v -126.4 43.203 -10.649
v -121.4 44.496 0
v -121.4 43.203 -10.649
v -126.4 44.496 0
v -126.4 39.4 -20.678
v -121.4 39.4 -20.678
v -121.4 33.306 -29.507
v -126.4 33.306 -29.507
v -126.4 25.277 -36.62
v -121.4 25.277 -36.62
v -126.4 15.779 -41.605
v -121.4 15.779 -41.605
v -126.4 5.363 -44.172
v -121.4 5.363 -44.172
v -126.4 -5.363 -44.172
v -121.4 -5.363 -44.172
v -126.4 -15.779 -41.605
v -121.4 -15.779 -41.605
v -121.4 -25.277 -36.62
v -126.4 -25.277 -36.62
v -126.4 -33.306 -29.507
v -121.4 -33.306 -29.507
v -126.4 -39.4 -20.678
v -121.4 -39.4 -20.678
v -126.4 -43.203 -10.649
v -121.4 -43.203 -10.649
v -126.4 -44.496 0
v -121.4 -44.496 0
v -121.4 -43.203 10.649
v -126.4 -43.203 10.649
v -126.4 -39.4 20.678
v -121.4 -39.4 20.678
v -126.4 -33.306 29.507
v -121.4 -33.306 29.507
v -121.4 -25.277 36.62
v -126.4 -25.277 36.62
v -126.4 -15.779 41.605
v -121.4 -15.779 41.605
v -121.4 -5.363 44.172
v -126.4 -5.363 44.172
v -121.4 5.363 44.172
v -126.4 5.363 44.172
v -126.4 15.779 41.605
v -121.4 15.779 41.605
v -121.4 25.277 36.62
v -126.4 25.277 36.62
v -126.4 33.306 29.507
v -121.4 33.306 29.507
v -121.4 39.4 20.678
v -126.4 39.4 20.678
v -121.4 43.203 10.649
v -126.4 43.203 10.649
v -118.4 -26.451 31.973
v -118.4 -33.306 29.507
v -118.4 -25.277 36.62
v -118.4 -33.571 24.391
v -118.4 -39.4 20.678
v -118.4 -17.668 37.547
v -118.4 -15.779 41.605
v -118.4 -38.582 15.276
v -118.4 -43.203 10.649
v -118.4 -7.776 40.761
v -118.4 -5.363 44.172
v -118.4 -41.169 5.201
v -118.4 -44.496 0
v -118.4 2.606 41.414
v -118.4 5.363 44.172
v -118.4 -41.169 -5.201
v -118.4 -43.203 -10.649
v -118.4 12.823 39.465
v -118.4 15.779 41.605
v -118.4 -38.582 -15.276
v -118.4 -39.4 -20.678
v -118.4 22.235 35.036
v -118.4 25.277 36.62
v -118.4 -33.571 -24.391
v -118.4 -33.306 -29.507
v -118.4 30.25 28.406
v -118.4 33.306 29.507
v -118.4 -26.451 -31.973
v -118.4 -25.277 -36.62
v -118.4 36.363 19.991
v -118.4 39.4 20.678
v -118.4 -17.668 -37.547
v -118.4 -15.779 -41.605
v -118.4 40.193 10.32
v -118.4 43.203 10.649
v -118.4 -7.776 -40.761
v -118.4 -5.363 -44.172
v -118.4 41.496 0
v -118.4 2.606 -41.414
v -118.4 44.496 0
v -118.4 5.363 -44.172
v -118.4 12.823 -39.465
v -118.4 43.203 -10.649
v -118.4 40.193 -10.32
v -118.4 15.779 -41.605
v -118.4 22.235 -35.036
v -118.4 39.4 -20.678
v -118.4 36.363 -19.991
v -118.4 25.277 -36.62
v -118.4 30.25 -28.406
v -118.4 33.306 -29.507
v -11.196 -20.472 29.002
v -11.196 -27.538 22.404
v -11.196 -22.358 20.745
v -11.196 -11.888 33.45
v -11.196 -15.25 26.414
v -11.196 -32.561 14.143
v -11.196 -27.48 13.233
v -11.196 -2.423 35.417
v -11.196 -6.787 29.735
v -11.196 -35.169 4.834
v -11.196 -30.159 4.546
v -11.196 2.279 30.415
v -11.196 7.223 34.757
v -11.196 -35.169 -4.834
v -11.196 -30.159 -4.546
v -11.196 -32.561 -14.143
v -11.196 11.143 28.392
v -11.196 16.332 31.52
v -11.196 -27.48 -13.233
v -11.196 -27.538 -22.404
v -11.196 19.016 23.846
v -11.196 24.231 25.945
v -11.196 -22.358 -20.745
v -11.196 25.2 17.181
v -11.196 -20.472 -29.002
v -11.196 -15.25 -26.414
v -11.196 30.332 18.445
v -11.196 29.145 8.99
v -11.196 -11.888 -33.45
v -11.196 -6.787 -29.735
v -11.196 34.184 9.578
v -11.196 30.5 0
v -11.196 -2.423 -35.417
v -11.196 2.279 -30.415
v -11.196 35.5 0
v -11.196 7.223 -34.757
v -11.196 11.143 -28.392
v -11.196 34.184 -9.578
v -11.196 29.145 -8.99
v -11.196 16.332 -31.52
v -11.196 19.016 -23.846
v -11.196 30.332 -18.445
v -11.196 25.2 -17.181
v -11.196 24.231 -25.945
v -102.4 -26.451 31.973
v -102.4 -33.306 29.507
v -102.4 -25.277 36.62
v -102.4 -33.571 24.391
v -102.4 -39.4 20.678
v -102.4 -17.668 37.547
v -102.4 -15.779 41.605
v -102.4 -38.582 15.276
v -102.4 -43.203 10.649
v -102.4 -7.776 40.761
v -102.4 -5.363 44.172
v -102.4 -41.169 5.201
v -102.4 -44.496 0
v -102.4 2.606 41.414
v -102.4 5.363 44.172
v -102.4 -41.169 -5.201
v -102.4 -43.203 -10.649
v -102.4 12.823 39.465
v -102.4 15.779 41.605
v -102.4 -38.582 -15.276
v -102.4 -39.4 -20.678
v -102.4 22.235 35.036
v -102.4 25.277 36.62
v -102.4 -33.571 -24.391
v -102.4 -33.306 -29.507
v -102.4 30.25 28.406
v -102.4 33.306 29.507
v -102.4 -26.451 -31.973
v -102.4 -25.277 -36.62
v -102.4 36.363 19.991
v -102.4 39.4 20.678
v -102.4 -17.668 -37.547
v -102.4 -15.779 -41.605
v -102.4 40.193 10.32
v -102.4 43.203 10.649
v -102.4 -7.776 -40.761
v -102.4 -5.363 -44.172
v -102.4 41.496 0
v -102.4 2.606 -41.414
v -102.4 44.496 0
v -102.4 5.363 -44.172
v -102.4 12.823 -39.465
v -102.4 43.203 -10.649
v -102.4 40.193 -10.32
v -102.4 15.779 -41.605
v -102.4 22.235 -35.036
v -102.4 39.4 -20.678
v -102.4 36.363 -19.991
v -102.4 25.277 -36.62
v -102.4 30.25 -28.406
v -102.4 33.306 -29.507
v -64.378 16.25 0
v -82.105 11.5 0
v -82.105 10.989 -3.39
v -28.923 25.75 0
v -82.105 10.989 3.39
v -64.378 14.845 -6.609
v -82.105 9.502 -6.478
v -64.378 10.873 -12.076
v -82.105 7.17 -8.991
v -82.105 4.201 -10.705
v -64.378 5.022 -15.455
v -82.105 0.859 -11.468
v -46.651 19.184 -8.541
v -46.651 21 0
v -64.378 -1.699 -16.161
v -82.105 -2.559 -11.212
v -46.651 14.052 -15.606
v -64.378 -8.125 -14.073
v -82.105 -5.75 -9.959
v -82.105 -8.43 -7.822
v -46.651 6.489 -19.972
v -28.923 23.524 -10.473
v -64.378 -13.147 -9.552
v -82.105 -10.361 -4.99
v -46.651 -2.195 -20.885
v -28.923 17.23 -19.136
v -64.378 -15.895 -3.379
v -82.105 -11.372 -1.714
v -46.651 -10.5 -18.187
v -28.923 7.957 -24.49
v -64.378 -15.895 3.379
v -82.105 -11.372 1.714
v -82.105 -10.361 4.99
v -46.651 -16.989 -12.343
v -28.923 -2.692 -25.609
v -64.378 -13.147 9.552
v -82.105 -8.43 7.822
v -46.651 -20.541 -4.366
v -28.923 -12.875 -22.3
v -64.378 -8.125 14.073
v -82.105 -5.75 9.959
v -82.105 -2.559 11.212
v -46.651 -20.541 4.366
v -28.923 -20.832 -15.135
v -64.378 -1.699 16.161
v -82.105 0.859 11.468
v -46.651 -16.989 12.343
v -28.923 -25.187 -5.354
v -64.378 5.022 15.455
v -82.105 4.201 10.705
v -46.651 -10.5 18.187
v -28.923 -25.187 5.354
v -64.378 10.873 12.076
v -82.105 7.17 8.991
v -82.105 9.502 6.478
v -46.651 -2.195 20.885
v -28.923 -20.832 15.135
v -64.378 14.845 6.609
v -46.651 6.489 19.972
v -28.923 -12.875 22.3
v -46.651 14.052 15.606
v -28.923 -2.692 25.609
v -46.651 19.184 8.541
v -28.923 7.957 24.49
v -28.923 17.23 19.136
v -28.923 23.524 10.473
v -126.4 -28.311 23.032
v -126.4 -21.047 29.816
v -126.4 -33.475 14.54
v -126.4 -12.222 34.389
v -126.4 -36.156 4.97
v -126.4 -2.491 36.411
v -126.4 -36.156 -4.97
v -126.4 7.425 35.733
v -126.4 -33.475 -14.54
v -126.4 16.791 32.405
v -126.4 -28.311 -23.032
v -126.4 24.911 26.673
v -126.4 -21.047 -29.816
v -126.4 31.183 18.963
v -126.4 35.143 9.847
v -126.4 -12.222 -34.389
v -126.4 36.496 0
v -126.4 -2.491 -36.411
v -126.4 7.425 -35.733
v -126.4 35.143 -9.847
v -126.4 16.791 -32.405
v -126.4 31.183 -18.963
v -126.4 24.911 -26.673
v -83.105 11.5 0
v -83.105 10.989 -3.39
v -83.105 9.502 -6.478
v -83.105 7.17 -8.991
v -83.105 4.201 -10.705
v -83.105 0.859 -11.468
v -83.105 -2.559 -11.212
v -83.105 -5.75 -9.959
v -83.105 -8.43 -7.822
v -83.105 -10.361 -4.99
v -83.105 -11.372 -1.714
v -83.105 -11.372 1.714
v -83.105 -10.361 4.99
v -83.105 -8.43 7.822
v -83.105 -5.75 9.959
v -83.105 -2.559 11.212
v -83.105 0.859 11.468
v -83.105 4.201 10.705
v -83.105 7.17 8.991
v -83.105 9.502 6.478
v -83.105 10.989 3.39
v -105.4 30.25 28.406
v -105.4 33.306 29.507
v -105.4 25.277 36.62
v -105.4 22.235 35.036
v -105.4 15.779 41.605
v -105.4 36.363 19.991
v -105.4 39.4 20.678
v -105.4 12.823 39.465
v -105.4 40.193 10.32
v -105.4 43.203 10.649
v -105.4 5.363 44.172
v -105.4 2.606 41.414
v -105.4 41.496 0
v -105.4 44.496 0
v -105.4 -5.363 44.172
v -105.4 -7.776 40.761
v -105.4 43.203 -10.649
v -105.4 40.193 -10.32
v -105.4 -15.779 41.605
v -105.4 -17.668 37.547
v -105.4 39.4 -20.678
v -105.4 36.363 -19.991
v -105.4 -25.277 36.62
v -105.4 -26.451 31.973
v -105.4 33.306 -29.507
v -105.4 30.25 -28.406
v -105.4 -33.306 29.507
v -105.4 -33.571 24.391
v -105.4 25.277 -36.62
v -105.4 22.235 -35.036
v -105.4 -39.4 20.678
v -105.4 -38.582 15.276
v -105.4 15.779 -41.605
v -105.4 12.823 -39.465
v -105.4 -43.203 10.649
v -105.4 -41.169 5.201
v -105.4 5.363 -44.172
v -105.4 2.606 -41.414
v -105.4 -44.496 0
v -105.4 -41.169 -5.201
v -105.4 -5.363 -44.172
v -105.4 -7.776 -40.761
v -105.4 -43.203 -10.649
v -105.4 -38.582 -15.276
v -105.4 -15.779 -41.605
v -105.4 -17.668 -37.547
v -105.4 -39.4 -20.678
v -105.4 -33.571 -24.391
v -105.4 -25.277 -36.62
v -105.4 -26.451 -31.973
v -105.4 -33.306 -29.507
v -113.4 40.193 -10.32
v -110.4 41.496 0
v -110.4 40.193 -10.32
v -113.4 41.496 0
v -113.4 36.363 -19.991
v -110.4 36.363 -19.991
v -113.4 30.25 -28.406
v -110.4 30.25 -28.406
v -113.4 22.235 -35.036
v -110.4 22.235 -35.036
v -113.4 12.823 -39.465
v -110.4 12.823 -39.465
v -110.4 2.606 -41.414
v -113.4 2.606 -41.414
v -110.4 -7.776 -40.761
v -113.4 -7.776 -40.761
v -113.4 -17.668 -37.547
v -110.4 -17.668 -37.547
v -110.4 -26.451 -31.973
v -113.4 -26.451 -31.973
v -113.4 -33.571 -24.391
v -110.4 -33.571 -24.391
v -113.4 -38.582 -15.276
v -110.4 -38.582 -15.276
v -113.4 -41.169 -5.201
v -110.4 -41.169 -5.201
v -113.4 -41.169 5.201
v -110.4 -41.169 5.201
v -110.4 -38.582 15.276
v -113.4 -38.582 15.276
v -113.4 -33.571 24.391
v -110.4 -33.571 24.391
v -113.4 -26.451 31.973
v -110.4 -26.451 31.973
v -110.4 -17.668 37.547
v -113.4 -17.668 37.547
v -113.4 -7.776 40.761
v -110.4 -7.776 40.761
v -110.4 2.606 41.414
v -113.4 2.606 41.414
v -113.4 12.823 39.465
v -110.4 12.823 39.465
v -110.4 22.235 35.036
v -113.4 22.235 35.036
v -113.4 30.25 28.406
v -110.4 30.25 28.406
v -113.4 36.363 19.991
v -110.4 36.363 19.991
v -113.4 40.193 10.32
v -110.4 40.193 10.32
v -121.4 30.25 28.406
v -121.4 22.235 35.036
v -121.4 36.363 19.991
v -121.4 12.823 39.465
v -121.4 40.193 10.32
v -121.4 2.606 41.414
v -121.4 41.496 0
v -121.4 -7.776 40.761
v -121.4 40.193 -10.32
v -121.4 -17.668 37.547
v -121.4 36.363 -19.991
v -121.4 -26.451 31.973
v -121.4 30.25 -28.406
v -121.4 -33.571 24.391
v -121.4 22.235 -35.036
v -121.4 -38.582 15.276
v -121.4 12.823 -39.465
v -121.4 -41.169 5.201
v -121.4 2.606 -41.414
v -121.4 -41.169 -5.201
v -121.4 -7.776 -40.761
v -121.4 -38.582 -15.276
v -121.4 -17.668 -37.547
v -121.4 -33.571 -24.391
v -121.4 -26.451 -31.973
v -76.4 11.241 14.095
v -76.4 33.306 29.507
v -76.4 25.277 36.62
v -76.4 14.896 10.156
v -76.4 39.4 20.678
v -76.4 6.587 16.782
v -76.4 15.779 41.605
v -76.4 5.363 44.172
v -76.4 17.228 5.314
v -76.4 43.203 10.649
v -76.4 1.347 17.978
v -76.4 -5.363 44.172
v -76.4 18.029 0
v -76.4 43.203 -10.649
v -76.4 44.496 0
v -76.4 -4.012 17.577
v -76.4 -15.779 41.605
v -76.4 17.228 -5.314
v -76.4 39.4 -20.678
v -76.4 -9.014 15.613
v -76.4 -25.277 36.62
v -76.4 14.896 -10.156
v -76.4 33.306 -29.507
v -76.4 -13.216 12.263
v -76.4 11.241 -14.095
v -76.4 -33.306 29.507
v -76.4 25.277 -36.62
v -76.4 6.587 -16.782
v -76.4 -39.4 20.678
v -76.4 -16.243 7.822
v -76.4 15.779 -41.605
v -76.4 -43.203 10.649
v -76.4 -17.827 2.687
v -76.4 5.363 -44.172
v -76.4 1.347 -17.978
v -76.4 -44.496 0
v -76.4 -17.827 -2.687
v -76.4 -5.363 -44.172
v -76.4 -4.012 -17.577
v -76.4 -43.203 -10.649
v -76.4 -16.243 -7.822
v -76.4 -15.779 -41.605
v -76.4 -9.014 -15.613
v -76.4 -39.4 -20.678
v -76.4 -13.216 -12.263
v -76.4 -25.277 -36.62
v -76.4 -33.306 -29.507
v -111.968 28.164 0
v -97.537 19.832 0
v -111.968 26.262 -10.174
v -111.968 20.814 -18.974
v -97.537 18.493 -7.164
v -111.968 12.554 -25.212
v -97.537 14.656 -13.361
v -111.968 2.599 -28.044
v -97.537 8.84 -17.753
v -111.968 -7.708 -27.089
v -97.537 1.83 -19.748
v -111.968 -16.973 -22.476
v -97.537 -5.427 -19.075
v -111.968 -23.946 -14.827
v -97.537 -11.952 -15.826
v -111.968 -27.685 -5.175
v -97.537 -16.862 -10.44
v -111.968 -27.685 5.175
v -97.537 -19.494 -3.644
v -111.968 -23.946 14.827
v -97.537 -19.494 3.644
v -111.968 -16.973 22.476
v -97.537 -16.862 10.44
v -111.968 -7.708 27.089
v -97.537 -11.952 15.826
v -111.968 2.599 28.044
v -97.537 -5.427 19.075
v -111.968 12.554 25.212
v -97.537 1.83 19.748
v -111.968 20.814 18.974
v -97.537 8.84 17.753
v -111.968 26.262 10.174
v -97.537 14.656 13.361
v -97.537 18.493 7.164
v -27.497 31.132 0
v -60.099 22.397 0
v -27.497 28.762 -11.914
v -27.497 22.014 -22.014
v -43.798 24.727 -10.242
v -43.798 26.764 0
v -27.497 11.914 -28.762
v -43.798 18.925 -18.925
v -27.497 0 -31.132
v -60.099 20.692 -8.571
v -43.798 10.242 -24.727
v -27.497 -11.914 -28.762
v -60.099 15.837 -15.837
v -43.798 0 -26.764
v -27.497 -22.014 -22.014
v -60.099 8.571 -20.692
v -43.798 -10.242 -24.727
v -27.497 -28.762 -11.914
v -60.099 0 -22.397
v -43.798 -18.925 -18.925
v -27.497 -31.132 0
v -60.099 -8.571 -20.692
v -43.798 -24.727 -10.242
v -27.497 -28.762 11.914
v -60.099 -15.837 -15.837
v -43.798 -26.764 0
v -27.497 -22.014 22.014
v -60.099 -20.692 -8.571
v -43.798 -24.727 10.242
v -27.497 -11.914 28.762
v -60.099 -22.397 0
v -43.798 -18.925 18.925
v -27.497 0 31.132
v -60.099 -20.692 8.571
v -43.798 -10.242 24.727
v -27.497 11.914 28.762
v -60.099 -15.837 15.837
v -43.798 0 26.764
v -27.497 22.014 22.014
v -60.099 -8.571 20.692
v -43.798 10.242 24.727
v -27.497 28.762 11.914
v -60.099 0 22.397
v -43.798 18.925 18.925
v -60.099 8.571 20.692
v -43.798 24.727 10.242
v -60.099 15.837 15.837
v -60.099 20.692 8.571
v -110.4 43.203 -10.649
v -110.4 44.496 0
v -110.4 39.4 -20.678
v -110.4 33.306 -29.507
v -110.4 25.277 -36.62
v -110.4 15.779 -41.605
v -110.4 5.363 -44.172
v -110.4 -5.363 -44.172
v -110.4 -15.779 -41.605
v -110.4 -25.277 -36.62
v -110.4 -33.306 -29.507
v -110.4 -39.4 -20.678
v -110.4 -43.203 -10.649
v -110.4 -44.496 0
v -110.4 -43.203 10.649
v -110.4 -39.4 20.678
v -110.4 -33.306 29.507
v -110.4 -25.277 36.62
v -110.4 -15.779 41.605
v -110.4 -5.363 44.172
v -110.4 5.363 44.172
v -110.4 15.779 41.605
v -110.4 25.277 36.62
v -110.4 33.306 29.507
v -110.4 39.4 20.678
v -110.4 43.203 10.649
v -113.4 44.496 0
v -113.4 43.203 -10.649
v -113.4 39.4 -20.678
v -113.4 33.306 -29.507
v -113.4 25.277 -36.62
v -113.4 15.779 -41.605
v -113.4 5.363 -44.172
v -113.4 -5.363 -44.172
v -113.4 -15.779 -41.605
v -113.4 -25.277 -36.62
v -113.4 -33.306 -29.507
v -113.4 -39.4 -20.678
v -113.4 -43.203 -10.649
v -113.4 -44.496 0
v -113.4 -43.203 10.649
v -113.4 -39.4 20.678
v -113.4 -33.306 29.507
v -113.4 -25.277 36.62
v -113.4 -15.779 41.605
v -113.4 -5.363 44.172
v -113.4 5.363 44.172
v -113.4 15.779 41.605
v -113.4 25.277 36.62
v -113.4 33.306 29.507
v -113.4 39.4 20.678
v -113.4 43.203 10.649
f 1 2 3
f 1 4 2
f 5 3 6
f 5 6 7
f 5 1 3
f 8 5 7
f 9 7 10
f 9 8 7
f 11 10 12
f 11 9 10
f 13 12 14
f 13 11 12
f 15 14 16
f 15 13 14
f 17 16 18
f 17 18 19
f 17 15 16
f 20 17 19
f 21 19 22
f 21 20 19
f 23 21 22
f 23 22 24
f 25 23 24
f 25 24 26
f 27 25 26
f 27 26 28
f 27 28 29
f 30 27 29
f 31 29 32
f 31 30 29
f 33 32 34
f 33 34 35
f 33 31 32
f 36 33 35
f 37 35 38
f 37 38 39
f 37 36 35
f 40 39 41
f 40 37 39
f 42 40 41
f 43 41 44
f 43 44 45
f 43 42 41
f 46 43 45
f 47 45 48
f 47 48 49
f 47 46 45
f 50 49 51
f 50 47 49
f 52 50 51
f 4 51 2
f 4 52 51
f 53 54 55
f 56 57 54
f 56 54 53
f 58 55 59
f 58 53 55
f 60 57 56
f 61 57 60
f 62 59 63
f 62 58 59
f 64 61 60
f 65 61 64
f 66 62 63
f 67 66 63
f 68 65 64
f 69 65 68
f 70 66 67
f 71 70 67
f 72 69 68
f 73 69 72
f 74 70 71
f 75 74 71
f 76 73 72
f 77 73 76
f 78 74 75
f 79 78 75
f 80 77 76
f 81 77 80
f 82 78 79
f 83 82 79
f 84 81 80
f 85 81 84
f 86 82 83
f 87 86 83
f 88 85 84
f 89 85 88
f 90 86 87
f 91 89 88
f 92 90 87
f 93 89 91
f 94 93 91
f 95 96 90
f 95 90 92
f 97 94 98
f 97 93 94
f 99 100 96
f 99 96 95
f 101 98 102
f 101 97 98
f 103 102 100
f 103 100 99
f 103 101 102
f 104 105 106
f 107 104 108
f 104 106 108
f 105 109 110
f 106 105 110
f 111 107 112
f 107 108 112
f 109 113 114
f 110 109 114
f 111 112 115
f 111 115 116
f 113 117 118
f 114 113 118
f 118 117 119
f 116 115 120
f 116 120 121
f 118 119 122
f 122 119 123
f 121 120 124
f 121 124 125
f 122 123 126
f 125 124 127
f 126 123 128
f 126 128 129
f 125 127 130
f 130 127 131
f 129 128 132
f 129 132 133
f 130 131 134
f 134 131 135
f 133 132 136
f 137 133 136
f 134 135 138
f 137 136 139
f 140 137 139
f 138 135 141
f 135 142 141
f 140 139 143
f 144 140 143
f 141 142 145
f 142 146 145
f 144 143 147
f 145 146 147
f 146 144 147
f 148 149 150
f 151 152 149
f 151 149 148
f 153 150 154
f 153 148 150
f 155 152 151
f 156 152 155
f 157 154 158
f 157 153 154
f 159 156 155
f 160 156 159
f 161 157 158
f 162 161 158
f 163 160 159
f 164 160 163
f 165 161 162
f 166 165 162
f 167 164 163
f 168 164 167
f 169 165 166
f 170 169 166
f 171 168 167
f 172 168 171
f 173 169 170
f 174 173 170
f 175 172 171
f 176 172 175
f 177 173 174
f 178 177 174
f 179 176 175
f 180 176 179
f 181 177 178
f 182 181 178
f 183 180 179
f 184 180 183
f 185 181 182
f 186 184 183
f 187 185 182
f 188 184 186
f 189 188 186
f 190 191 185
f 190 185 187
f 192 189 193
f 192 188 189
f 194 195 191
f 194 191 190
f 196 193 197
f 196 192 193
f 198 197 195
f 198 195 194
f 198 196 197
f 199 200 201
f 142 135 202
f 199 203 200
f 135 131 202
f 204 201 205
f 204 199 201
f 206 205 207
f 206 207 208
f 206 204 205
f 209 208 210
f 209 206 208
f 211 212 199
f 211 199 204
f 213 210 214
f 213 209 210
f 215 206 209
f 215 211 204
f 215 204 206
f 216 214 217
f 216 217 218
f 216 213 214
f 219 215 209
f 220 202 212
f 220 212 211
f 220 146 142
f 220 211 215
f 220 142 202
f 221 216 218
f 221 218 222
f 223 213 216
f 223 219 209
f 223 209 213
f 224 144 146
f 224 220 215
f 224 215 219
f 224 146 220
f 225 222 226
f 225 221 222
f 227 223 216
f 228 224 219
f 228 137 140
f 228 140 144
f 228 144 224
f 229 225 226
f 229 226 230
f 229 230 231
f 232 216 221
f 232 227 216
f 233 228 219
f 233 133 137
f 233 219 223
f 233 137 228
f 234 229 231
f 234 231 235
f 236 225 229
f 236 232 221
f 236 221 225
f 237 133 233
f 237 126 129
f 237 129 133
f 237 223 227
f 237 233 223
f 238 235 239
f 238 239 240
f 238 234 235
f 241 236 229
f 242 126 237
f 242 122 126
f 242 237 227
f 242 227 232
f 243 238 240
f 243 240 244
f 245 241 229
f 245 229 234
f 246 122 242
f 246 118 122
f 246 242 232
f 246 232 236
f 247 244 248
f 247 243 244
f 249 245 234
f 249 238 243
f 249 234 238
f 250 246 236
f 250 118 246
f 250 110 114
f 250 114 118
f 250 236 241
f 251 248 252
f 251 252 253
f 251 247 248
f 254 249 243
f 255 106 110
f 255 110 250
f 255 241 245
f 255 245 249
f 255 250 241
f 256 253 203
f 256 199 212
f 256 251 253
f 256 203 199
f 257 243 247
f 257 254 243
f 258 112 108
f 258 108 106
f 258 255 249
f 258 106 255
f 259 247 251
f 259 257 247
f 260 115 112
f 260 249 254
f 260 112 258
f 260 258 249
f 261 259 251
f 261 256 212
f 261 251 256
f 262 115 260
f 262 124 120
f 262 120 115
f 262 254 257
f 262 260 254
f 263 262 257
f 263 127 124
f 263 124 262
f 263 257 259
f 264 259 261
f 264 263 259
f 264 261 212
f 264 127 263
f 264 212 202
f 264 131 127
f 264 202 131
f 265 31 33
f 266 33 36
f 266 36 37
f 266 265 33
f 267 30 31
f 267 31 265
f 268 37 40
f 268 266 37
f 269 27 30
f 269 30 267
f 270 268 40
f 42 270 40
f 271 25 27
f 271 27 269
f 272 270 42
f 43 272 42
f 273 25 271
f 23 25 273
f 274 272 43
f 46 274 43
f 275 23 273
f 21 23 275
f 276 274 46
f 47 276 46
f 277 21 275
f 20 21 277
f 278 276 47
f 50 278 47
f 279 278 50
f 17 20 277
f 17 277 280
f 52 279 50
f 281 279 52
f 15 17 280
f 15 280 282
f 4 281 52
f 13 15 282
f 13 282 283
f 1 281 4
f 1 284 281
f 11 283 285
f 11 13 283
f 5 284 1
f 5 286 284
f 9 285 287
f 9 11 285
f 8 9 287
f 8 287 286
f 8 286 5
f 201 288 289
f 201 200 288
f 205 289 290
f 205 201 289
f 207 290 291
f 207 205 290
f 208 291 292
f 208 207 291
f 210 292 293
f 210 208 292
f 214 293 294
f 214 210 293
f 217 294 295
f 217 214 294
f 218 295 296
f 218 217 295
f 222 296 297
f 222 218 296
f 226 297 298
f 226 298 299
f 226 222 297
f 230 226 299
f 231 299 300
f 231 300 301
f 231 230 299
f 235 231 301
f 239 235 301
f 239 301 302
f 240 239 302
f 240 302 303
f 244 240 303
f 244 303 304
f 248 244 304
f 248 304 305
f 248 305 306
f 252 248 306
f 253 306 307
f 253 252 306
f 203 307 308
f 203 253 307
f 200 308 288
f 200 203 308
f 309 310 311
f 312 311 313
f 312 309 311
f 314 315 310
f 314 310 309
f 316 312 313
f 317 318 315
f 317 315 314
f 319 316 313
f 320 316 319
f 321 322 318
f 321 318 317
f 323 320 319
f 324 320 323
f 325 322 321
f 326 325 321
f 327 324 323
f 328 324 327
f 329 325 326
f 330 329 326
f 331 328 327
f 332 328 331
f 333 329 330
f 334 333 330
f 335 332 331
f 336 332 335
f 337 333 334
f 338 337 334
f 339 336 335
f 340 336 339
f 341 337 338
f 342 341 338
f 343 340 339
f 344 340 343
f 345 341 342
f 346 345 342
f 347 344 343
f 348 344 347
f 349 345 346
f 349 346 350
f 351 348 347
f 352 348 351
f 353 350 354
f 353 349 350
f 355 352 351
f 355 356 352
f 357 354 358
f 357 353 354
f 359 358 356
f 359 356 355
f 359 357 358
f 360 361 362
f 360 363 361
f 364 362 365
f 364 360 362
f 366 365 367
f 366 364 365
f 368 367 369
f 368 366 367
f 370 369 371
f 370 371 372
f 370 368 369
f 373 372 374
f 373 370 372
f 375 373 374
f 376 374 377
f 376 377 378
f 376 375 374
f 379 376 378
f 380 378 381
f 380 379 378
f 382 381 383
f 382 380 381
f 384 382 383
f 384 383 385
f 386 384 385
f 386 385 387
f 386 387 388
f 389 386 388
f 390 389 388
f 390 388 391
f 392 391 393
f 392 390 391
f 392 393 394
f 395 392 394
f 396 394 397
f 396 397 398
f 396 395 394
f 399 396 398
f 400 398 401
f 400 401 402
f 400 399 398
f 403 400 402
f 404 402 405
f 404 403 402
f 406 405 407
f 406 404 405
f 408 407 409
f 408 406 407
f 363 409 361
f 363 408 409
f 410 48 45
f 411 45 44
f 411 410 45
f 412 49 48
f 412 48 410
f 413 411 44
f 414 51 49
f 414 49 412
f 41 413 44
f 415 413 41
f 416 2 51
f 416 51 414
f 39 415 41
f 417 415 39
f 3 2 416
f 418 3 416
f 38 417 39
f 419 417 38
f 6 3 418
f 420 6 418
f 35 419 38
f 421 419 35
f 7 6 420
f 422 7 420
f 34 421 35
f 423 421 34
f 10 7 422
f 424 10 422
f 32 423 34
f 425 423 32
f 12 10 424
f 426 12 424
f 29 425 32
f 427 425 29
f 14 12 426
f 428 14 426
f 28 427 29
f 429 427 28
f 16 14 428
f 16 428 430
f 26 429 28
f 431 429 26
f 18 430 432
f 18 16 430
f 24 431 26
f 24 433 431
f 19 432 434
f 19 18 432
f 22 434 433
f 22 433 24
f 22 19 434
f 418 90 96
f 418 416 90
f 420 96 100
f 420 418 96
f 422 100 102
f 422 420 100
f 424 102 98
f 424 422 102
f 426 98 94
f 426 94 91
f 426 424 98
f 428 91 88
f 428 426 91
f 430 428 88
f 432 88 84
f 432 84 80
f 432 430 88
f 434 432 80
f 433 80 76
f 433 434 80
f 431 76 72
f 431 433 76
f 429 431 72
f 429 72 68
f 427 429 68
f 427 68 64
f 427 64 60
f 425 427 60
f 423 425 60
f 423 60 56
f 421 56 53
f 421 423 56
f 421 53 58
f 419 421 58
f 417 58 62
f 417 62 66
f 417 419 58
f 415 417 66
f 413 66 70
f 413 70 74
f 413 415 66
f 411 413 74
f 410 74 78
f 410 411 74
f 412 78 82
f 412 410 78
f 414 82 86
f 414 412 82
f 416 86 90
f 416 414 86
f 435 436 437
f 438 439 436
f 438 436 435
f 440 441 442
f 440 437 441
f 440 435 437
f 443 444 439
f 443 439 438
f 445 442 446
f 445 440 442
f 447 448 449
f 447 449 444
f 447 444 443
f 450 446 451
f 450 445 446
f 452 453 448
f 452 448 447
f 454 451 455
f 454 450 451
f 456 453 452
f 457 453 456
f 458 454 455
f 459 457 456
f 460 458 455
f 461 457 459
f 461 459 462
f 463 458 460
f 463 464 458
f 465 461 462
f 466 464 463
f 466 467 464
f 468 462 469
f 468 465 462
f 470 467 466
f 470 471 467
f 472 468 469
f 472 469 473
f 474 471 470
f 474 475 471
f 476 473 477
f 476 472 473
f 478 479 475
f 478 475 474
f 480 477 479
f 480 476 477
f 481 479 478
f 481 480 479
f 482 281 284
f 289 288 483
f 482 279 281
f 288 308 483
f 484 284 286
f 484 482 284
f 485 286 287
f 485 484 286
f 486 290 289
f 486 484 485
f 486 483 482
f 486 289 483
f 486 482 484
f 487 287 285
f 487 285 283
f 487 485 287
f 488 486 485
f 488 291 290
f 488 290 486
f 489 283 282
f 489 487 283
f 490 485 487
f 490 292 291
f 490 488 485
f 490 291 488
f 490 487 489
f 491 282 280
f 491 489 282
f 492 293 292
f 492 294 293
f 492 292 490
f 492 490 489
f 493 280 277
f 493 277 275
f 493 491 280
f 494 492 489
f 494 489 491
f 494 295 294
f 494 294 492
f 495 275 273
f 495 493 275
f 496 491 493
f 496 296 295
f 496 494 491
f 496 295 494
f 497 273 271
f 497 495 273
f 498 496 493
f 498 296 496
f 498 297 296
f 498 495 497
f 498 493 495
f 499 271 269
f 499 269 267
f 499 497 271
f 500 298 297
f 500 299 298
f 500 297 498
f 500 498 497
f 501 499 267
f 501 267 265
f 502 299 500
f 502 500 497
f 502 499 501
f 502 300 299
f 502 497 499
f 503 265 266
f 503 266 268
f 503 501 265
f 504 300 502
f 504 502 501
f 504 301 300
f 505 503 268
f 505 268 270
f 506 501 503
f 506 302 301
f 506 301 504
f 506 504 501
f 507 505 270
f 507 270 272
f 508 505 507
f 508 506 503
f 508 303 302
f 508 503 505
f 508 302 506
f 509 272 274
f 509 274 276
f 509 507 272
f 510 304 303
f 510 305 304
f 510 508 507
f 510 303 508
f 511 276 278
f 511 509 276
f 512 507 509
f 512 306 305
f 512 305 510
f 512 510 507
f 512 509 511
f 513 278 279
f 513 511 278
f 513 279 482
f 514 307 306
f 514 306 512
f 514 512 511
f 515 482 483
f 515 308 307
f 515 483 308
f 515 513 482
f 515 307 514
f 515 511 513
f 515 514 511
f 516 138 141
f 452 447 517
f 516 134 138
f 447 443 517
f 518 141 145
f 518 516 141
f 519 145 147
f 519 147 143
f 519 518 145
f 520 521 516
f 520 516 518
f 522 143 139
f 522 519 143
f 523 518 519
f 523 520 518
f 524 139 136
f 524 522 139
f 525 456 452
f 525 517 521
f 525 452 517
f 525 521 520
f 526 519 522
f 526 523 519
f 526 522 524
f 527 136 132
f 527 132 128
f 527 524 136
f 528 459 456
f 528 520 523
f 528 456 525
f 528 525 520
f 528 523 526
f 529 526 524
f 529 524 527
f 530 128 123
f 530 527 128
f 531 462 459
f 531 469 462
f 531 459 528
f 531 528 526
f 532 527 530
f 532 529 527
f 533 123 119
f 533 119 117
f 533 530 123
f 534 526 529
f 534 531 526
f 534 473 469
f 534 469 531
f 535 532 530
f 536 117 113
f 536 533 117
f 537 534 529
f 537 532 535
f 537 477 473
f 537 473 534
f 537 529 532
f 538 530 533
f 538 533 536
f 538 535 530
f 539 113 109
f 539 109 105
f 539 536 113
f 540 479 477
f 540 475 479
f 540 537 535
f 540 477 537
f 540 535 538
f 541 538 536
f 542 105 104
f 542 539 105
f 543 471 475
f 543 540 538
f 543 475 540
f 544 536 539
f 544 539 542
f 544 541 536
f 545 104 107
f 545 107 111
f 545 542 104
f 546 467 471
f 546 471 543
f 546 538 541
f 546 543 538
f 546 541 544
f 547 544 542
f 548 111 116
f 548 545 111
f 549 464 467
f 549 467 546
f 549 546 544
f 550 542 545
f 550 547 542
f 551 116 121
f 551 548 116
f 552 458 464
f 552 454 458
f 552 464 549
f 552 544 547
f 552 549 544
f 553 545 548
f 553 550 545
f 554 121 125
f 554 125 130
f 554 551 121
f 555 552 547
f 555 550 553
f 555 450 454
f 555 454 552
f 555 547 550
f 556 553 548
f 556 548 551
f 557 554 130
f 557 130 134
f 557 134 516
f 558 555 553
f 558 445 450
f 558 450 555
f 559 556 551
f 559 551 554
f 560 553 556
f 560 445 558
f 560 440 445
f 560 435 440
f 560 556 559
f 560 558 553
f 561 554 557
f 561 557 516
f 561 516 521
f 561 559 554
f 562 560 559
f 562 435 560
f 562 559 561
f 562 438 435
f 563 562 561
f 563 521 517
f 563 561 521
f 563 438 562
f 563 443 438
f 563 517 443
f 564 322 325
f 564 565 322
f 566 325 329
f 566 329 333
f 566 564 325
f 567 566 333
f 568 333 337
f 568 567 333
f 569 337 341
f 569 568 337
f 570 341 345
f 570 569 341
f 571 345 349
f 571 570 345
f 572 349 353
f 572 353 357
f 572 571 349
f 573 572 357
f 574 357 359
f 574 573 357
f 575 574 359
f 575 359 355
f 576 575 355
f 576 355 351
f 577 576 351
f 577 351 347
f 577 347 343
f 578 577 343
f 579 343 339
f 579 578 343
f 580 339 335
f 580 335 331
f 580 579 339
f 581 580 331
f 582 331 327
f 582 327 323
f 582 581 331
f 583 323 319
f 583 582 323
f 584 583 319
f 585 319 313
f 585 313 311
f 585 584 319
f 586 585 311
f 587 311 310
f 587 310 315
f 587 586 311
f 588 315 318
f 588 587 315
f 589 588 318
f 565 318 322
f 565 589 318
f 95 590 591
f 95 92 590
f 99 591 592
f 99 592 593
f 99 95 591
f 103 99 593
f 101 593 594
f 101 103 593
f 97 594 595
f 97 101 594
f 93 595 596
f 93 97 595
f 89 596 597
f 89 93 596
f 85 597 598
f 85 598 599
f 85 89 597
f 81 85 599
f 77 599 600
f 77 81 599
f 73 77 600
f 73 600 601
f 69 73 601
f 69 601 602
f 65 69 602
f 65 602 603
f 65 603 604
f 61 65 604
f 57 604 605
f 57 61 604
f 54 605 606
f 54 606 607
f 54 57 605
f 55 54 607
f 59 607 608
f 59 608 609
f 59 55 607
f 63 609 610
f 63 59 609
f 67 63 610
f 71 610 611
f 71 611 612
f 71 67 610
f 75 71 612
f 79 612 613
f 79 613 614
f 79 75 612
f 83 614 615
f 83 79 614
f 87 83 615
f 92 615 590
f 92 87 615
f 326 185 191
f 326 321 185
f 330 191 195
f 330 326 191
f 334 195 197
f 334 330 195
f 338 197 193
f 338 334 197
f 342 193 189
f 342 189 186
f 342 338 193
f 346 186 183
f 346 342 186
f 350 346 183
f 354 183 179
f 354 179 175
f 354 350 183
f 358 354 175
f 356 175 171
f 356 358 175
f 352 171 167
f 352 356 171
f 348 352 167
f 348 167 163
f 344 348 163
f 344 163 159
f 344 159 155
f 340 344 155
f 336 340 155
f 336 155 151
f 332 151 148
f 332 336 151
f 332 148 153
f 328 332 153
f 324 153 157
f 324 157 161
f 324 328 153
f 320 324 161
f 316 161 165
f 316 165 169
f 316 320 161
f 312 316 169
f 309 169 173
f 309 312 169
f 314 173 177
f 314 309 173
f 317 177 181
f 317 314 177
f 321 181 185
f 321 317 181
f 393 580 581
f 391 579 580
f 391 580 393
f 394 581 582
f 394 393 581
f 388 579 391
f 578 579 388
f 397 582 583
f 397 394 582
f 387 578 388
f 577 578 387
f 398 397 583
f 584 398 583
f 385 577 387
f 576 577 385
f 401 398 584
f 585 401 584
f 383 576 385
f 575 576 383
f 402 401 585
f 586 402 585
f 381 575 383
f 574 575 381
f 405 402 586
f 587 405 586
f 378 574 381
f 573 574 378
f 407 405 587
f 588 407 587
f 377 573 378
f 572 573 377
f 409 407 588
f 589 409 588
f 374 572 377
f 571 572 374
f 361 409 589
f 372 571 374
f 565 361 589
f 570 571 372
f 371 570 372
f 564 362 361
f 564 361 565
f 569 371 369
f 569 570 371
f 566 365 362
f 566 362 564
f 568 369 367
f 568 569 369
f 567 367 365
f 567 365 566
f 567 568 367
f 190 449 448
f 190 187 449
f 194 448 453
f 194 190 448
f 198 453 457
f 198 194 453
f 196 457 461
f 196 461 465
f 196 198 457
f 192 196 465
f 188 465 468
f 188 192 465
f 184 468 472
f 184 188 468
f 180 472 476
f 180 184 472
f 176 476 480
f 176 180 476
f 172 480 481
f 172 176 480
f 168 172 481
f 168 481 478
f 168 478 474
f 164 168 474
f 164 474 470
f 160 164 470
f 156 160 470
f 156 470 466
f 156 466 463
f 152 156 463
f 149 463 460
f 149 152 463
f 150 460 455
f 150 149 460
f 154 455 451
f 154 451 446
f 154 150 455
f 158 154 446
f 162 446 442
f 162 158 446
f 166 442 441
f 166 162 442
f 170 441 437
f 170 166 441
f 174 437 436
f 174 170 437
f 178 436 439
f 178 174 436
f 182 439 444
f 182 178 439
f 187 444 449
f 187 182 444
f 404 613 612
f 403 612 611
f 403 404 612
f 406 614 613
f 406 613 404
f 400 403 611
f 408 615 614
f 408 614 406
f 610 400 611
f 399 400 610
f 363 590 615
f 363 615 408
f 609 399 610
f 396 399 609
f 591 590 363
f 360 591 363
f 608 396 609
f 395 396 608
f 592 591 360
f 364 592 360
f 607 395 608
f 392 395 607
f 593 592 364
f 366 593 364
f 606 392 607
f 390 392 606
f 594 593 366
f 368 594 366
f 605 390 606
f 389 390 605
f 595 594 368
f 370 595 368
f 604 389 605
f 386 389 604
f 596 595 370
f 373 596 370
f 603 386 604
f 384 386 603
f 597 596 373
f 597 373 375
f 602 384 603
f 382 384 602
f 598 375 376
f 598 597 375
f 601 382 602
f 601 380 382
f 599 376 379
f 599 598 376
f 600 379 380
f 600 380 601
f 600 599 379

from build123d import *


with BuildPart() as part:
    # Sketch1 → Revolve1 (revolve)
    with BuildSketch(Plane.XY):
        Polygon((-82.105117767, 11.5), (0, 33.5), (0, 38.5), (-76.4, 18.028681698), (-76.4, 44.496311912), (-102.4, 44.496311912), (-102.4, 41.496311912), (-105.4, 41.496311912), (-105.4, 44.496311912), (-110.4, 44.496311912), (-110.4, 41.496311912), (-113.4, 41.496311912), (-113.4, 44.496311912), (-118.4, 44.496311912), (-118.4, 41.496311912), (-121.4, 41.496311912), (-121.4, 44.496311912), (-126.4, 44.496311912), (-126.4, 36.496311912), (-83.105117767, 11.5), align=None)
    revolve(axis=Axis((0, 0, 0), (-1, 0, 0)))

    # Sketch2 → Cut-Revolve1 (revolve, cut)
    with BuildSketch(Plane.XY):
        Polygon((-11.196152423, 0), (-11.196152423, 35.5), (-11.196152423, 56.271944123), (14.531335426, 56.271944123), (14.531335426, 0), align=None)
    revolve(axis=Axis((0, 0, 0), (-1, 0, 0)), mode=Mode.SUBTRACT)


solid = part.part
